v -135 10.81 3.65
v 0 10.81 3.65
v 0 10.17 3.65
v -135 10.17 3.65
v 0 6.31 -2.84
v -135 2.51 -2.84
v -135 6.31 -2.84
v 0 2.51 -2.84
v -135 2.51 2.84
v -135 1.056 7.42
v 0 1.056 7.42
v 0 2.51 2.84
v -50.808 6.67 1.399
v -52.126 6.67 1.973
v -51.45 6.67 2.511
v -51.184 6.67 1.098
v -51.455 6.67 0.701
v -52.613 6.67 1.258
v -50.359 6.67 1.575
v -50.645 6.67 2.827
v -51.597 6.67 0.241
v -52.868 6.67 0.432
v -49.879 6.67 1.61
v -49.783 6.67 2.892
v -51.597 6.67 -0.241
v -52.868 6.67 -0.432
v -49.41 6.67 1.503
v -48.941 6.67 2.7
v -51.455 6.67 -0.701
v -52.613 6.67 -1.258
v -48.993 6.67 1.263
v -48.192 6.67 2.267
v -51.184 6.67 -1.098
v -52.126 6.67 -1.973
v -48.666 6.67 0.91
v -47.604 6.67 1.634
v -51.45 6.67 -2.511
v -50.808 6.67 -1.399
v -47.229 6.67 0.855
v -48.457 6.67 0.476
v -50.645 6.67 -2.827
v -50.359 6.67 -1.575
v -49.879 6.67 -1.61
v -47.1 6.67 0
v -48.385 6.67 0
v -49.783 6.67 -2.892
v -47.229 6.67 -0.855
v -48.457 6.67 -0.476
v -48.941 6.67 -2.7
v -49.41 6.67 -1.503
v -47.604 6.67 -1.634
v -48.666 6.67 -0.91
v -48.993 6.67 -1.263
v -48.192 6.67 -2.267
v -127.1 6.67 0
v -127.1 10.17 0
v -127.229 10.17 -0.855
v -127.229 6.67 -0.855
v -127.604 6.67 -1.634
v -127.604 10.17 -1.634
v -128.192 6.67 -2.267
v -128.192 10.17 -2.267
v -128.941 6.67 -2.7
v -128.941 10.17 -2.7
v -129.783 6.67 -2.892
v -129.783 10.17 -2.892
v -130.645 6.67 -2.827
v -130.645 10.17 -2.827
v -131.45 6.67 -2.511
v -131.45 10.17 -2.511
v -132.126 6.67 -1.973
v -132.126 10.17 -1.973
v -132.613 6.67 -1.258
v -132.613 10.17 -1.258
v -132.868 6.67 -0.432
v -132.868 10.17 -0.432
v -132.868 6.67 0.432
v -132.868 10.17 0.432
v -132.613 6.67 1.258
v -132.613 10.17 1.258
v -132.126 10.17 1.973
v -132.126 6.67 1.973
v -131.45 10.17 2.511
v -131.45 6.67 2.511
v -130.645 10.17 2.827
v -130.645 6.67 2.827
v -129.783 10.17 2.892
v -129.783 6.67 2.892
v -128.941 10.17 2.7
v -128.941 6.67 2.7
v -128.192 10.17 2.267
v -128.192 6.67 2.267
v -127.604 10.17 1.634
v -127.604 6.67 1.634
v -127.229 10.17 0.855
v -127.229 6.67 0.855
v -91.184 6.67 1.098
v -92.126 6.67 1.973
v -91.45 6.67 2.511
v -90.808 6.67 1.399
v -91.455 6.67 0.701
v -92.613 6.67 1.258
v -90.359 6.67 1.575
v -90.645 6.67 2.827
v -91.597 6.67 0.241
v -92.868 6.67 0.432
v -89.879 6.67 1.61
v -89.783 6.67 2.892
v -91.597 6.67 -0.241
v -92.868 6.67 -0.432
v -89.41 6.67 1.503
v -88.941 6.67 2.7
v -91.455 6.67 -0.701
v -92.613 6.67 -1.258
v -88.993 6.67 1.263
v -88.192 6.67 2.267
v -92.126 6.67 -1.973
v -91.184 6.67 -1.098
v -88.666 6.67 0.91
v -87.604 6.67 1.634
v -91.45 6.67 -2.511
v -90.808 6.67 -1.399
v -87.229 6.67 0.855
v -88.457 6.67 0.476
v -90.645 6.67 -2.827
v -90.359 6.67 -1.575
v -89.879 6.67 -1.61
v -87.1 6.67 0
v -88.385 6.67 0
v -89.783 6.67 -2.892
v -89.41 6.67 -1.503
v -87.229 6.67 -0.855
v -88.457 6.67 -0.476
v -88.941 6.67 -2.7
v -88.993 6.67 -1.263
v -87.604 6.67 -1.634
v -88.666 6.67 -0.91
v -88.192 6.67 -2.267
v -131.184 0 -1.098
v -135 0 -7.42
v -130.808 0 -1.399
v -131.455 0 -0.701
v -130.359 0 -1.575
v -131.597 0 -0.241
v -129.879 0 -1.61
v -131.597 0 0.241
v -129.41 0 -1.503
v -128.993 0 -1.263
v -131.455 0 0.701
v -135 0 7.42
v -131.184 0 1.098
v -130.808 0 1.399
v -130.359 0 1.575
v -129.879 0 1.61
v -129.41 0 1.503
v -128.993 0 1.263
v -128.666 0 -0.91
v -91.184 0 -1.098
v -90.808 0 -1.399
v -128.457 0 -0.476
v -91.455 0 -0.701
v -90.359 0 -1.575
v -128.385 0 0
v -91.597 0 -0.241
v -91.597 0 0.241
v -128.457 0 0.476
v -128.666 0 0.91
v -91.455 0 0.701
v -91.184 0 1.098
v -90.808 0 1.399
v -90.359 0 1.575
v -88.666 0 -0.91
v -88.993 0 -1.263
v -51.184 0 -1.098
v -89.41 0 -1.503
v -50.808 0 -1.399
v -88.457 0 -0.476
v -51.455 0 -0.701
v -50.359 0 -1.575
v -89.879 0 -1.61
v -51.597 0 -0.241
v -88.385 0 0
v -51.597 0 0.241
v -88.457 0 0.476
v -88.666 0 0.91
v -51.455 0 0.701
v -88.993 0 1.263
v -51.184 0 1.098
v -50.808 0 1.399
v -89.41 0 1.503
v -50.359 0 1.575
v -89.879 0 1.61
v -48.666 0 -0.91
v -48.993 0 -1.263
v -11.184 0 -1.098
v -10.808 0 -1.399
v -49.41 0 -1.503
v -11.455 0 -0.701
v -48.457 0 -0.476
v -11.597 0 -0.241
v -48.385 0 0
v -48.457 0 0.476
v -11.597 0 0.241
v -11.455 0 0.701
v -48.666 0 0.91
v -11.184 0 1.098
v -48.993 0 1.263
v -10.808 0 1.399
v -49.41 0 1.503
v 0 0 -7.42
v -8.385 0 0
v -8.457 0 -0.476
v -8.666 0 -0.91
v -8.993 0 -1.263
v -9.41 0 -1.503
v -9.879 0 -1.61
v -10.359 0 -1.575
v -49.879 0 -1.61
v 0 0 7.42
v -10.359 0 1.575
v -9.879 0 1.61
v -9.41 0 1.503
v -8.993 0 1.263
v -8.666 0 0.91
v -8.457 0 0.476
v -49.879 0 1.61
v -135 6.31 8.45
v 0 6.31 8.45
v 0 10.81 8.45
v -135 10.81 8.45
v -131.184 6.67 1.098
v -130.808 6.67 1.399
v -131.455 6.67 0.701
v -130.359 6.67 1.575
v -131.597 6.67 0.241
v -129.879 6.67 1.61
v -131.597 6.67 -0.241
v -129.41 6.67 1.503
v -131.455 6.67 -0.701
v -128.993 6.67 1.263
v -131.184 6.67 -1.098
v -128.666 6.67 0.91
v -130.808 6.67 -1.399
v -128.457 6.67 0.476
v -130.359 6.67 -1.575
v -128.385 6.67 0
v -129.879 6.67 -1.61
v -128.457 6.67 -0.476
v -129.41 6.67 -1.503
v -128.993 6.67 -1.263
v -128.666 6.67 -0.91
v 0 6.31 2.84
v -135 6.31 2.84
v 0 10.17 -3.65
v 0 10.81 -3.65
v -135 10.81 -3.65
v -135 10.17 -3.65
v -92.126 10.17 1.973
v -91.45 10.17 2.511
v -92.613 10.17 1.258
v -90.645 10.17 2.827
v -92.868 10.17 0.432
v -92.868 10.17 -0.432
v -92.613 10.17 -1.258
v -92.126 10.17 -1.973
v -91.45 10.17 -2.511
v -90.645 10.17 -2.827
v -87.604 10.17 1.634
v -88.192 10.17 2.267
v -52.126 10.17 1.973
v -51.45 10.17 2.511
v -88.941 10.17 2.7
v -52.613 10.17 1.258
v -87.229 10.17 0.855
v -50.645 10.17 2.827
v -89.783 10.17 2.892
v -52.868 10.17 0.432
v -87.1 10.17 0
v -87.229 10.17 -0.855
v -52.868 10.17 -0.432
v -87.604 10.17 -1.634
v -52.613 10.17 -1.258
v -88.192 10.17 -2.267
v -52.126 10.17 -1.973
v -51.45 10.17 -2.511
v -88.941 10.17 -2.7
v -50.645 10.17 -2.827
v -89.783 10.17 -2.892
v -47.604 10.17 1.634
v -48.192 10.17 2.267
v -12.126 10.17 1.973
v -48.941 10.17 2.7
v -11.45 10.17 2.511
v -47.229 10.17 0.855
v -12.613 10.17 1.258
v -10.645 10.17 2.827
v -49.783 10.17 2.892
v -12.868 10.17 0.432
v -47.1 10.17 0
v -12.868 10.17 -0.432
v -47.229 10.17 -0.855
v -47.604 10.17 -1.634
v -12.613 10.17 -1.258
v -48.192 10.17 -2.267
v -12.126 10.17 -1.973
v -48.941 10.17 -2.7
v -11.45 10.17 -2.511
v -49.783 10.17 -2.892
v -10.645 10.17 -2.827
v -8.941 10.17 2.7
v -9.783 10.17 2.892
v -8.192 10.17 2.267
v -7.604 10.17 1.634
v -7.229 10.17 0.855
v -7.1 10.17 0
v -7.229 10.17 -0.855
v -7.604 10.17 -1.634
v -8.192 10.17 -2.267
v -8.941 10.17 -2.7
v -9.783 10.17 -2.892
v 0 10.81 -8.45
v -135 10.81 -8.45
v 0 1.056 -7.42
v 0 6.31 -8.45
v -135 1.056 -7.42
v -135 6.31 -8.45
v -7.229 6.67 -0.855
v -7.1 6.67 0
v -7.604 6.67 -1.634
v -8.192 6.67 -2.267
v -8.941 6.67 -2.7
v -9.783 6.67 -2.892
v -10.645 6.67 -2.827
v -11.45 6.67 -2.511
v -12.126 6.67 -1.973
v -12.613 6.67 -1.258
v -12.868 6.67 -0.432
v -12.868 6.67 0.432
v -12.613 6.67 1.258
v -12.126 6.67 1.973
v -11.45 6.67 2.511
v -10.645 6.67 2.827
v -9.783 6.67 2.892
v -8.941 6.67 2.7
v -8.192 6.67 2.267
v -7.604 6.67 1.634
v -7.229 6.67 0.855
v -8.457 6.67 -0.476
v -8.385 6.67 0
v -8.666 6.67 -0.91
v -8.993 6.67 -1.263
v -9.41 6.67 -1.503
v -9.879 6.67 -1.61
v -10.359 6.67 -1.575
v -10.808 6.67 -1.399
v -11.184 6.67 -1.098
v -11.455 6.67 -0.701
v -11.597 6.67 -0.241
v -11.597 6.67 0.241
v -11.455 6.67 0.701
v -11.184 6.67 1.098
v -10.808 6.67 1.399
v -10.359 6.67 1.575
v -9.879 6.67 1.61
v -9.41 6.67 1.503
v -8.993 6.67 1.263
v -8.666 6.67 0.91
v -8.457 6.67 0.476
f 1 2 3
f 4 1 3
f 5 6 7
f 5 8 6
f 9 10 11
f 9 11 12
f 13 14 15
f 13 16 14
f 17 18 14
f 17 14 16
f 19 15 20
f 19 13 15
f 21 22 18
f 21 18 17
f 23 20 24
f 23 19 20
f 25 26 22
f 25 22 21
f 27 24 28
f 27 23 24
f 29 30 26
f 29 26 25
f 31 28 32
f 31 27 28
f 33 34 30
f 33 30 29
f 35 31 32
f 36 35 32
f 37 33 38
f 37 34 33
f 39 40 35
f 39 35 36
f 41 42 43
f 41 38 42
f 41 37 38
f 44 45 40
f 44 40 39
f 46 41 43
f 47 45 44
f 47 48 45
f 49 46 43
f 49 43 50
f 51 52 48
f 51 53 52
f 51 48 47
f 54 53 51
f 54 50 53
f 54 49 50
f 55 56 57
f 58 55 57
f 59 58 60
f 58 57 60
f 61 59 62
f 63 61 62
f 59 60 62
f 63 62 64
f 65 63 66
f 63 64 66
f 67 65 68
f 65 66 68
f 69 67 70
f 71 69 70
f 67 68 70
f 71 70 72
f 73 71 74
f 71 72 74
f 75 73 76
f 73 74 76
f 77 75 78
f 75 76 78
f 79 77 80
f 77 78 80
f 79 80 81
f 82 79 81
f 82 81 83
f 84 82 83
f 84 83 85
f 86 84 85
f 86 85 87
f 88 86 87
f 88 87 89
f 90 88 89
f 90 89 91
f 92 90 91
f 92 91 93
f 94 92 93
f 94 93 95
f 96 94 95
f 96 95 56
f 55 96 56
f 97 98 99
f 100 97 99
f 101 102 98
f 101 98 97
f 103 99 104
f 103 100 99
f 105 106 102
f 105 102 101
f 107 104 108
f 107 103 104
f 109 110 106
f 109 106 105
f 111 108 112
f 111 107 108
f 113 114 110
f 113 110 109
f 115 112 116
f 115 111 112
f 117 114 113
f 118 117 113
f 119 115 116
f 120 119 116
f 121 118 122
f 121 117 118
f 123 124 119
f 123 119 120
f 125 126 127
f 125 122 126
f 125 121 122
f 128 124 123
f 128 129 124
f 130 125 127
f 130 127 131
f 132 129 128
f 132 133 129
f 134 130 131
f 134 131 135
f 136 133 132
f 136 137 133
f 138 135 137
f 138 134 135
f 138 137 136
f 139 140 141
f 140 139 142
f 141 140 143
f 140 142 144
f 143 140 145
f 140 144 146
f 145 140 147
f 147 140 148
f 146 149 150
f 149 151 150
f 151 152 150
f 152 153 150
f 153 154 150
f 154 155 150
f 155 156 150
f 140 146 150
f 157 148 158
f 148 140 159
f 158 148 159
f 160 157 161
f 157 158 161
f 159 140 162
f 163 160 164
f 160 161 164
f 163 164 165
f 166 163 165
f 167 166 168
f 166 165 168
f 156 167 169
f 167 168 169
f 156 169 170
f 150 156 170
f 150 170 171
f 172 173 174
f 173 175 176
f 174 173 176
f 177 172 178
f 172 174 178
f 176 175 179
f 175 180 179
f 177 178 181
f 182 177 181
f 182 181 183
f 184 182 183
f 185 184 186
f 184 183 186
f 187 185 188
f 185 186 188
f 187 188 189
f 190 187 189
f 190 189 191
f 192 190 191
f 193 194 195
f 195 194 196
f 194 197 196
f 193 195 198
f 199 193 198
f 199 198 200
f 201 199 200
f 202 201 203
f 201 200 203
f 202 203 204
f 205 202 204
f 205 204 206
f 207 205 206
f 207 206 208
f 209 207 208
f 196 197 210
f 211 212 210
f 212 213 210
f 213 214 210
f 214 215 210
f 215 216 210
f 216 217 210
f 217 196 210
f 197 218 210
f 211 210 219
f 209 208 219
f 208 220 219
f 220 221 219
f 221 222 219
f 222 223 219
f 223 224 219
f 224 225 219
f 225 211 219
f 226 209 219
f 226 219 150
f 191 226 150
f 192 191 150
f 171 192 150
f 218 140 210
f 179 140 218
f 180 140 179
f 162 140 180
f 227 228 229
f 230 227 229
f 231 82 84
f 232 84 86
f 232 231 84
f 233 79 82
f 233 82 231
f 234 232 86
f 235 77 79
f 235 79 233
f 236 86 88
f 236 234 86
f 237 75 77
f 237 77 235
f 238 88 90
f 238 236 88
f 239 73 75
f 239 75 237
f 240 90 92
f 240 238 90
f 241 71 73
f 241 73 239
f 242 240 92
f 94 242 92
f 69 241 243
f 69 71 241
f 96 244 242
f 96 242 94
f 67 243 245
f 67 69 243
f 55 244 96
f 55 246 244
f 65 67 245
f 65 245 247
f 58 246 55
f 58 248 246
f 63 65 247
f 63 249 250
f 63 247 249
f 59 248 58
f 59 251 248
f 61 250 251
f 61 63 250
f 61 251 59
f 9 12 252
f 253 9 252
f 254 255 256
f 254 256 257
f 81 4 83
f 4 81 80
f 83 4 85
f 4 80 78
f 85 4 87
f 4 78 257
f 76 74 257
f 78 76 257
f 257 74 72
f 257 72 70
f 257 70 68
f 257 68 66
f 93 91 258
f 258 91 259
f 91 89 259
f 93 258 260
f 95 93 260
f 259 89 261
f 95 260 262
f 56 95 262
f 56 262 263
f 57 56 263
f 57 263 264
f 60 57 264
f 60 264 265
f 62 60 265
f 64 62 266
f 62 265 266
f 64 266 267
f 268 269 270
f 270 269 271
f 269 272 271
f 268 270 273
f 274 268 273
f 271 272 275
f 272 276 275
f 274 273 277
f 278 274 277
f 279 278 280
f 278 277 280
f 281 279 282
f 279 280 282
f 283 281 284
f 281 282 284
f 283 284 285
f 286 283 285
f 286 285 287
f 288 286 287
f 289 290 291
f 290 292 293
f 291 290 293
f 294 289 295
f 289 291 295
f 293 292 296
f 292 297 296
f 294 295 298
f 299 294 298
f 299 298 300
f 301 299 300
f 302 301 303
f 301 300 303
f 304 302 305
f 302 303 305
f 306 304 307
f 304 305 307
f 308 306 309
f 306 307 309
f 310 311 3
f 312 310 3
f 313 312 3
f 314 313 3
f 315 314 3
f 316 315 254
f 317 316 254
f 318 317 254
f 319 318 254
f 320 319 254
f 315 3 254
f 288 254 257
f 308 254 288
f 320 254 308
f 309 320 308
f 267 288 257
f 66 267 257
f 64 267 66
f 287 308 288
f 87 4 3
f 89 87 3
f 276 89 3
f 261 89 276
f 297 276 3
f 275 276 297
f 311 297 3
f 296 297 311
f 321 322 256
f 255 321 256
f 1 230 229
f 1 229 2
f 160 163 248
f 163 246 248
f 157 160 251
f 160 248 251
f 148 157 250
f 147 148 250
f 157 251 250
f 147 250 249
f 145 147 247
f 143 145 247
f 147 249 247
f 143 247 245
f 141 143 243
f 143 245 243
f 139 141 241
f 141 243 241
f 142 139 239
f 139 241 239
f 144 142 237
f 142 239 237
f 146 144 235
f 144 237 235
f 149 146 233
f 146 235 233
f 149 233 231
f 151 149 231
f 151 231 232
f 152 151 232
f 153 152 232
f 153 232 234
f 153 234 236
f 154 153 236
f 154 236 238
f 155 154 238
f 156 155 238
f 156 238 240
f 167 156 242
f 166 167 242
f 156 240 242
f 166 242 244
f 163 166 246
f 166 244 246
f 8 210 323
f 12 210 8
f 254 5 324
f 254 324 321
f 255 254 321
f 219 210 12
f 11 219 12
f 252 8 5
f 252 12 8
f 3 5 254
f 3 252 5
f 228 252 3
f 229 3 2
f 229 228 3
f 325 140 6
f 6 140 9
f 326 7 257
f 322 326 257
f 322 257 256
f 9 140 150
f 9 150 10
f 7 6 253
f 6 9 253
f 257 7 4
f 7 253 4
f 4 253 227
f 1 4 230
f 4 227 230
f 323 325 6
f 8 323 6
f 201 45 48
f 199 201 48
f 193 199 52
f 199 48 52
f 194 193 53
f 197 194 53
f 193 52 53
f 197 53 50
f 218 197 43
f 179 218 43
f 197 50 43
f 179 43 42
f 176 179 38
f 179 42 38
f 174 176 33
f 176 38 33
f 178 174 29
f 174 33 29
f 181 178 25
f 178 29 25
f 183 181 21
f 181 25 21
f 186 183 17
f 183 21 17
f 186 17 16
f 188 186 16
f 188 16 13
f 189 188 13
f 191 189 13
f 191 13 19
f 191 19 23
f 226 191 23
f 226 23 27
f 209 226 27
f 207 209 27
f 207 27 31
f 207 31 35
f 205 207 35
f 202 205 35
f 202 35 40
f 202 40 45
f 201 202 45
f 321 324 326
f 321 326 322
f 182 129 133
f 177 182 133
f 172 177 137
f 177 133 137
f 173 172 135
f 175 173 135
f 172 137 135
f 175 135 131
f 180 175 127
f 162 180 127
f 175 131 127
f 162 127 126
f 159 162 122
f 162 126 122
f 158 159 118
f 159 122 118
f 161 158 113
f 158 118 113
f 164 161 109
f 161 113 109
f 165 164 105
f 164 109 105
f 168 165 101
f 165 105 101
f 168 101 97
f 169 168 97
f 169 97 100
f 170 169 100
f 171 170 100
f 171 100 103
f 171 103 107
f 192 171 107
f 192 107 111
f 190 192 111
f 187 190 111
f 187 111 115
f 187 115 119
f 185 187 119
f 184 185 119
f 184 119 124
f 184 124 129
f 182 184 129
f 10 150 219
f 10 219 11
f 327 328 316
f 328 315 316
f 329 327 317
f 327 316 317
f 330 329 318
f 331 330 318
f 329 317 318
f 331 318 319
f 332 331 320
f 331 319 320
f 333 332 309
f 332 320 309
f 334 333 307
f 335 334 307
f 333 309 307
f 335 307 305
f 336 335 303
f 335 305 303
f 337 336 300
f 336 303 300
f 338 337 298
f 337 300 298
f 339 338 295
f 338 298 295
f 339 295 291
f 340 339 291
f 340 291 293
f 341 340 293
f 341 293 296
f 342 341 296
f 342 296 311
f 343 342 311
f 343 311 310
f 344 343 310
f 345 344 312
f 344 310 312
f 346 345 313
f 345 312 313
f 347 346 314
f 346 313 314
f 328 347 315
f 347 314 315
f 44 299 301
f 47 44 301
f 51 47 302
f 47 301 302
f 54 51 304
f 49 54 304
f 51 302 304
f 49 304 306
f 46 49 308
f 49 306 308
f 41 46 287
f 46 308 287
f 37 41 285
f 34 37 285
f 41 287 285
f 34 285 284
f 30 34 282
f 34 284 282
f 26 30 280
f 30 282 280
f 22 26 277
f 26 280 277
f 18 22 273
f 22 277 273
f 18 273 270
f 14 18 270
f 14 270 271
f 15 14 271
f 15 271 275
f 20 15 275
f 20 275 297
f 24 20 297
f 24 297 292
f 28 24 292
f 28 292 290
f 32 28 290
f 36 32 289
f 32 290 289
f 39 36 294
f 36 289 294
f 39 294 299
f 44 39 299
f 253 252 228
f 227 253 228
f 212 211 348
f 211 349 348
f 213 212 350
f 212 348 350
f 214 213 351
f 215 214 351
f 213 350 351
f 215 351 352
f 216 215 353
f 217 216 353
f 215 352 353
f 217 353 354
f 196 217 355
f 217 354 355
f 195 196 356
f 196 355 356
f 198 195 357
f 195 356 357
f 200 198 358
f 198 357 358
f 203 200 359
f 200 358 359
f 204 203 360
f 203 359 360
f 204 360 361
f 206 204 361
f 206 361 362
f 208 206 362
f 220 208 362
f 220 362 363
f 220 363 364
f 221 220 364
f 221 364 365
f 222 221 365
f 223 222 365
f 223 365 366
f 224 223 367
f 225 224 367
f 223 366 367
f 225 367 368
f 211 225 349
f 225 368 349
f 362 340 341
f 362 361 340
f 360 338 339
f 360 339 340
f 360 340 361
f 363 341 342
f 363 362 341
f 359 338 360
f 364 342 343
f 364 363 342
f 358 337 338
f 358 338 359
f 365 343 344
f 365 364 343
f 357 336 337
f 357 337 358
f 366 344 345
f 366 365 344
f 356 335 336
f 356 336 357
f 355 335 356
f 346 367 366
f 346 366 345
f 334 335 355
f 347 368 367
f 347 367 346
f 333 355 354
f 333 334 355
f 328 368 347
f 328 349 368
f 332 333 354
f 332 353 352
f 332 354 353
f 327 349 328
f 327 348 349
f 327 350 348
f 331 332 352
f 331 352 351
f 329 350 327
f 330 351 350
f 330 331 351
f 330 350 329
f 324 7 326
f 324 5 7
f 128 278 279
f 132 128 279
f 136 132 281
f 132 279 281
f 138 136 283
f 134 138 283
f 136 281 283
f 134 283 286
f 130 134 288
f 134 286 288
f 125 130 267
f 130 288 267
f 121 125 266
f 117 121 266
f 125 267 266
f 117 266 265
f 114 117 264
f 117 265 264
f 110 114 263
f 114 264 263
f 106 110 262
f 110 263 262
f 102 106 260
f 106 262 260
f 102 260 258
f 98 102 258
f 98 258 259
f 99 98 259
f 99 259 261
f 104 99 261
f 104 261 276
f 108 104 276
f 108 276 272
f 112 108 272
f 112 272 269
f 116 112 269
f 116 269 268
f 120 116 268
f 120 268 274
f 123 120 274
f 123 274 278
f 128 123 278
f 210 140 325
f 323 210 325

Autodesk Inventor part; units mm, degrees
ref_plane "YZ Plane" through (0, 0, 0) normal (1, 0, 0) x (0, 1, 0)
ref_plane "XZ Plane" through (0, 0, 0) normal (0, 1, 0) x (-1, 0, 0)
ref_plane "XY Plane" through (0, 0, 0) normal (0, 0, 1) x (1, 0, 0)
sketch "Sketch1" plane through (0, 0, 0) normal (1, 0, 0) x (0, 1, 0)
  line L0 (0, 0) -> (0, -7.42)
  line L1 (0, -7.42) -> (1.0563, -7.42)
  line L2 (1.0563, -7.42) -> (2.51, -2.84)
  line L3 (2.51, -2.84) -> (6.31, -2.84)
  line L4 (6.31, -2.84) -> (6.31, -8.45)
  line L5 (6.31, -8.45) -> (10.81, -8.45)
  line L6 (10.81, -8.45) -> (10.81, -3.65)
  line L7 (10.81, -3.65) -> (10.17, -3.65)
  line L8 (10.17, -3.65) -> (10.17, 0)
  line L9 (0, 0) -> (9.5063, 0) construction
  line L10 (0, 0) -> (0, 7.42)
  line L11 (0, 7.42) -> (1.0563, 7.42)
  line L12 (1.0563, 7.42) -> (2.51, 2.84)
  line L13 (2.51, 2.84) -> (6.31, 2.84)
  line L14 (6.31, 2.84) -> (6.31, 8.45)
  line L15 (6.31, 8.45) -> (10.81, 8.45)
  line L16 (10.81, 8.45) -> (10.81, 3.65)
  line L17 (10.81, 3.65) -> (10.17, 3.65)
  line L18 (10.17, 3.65) -> (10.17, 0)
  dimension "d0" = 8.45
  dimension "d1" = 4.5
  dimension "d2" = 0.64
  dimension "d3" = 3.8
  dimension "d4" = 7.42
  dimension "d5" = 3.65
  dimension "d6" = 10.81
  dimension "d7" = 2.84
extrude "Extrusion1" add sketch "Sketch1" against normal blind 135
sketch "Sketch2" plane through (0, 10.17, 3.65) normal (0, 1, 0) x (1, 0, 0)
  line L0 (0, 3.65) -> (-10, 3.65) construction
  circle A0 centre (-10, 3.65) radius 1.615
  dimension "d10" = 3.23
  dimension "d11" = 10
extrude "Extrusion2" cut sketch "Sketch2" against normal blind 30
sketch "Sketch3" plane through (0, 10.17, 3.65) normal (0, 1, 0) x (1, 0, 0)
  circle A0 centre (-10, 3.65) radius 1.615 projected
  circle A1 centre (-10, 3.65) radius 2.9
  point P0 (0, 3.65)
  dimension "d14" = 5.8
extrude "Extrusion3" cut sketch "Sketch3" against normal blind 3.5
pattern_linear "Rectangular Pattern1" count 8 spacing 40 along (-1, 0, 0) of "Extrusion3", "Extrusion2"
properties part number "Rail"
